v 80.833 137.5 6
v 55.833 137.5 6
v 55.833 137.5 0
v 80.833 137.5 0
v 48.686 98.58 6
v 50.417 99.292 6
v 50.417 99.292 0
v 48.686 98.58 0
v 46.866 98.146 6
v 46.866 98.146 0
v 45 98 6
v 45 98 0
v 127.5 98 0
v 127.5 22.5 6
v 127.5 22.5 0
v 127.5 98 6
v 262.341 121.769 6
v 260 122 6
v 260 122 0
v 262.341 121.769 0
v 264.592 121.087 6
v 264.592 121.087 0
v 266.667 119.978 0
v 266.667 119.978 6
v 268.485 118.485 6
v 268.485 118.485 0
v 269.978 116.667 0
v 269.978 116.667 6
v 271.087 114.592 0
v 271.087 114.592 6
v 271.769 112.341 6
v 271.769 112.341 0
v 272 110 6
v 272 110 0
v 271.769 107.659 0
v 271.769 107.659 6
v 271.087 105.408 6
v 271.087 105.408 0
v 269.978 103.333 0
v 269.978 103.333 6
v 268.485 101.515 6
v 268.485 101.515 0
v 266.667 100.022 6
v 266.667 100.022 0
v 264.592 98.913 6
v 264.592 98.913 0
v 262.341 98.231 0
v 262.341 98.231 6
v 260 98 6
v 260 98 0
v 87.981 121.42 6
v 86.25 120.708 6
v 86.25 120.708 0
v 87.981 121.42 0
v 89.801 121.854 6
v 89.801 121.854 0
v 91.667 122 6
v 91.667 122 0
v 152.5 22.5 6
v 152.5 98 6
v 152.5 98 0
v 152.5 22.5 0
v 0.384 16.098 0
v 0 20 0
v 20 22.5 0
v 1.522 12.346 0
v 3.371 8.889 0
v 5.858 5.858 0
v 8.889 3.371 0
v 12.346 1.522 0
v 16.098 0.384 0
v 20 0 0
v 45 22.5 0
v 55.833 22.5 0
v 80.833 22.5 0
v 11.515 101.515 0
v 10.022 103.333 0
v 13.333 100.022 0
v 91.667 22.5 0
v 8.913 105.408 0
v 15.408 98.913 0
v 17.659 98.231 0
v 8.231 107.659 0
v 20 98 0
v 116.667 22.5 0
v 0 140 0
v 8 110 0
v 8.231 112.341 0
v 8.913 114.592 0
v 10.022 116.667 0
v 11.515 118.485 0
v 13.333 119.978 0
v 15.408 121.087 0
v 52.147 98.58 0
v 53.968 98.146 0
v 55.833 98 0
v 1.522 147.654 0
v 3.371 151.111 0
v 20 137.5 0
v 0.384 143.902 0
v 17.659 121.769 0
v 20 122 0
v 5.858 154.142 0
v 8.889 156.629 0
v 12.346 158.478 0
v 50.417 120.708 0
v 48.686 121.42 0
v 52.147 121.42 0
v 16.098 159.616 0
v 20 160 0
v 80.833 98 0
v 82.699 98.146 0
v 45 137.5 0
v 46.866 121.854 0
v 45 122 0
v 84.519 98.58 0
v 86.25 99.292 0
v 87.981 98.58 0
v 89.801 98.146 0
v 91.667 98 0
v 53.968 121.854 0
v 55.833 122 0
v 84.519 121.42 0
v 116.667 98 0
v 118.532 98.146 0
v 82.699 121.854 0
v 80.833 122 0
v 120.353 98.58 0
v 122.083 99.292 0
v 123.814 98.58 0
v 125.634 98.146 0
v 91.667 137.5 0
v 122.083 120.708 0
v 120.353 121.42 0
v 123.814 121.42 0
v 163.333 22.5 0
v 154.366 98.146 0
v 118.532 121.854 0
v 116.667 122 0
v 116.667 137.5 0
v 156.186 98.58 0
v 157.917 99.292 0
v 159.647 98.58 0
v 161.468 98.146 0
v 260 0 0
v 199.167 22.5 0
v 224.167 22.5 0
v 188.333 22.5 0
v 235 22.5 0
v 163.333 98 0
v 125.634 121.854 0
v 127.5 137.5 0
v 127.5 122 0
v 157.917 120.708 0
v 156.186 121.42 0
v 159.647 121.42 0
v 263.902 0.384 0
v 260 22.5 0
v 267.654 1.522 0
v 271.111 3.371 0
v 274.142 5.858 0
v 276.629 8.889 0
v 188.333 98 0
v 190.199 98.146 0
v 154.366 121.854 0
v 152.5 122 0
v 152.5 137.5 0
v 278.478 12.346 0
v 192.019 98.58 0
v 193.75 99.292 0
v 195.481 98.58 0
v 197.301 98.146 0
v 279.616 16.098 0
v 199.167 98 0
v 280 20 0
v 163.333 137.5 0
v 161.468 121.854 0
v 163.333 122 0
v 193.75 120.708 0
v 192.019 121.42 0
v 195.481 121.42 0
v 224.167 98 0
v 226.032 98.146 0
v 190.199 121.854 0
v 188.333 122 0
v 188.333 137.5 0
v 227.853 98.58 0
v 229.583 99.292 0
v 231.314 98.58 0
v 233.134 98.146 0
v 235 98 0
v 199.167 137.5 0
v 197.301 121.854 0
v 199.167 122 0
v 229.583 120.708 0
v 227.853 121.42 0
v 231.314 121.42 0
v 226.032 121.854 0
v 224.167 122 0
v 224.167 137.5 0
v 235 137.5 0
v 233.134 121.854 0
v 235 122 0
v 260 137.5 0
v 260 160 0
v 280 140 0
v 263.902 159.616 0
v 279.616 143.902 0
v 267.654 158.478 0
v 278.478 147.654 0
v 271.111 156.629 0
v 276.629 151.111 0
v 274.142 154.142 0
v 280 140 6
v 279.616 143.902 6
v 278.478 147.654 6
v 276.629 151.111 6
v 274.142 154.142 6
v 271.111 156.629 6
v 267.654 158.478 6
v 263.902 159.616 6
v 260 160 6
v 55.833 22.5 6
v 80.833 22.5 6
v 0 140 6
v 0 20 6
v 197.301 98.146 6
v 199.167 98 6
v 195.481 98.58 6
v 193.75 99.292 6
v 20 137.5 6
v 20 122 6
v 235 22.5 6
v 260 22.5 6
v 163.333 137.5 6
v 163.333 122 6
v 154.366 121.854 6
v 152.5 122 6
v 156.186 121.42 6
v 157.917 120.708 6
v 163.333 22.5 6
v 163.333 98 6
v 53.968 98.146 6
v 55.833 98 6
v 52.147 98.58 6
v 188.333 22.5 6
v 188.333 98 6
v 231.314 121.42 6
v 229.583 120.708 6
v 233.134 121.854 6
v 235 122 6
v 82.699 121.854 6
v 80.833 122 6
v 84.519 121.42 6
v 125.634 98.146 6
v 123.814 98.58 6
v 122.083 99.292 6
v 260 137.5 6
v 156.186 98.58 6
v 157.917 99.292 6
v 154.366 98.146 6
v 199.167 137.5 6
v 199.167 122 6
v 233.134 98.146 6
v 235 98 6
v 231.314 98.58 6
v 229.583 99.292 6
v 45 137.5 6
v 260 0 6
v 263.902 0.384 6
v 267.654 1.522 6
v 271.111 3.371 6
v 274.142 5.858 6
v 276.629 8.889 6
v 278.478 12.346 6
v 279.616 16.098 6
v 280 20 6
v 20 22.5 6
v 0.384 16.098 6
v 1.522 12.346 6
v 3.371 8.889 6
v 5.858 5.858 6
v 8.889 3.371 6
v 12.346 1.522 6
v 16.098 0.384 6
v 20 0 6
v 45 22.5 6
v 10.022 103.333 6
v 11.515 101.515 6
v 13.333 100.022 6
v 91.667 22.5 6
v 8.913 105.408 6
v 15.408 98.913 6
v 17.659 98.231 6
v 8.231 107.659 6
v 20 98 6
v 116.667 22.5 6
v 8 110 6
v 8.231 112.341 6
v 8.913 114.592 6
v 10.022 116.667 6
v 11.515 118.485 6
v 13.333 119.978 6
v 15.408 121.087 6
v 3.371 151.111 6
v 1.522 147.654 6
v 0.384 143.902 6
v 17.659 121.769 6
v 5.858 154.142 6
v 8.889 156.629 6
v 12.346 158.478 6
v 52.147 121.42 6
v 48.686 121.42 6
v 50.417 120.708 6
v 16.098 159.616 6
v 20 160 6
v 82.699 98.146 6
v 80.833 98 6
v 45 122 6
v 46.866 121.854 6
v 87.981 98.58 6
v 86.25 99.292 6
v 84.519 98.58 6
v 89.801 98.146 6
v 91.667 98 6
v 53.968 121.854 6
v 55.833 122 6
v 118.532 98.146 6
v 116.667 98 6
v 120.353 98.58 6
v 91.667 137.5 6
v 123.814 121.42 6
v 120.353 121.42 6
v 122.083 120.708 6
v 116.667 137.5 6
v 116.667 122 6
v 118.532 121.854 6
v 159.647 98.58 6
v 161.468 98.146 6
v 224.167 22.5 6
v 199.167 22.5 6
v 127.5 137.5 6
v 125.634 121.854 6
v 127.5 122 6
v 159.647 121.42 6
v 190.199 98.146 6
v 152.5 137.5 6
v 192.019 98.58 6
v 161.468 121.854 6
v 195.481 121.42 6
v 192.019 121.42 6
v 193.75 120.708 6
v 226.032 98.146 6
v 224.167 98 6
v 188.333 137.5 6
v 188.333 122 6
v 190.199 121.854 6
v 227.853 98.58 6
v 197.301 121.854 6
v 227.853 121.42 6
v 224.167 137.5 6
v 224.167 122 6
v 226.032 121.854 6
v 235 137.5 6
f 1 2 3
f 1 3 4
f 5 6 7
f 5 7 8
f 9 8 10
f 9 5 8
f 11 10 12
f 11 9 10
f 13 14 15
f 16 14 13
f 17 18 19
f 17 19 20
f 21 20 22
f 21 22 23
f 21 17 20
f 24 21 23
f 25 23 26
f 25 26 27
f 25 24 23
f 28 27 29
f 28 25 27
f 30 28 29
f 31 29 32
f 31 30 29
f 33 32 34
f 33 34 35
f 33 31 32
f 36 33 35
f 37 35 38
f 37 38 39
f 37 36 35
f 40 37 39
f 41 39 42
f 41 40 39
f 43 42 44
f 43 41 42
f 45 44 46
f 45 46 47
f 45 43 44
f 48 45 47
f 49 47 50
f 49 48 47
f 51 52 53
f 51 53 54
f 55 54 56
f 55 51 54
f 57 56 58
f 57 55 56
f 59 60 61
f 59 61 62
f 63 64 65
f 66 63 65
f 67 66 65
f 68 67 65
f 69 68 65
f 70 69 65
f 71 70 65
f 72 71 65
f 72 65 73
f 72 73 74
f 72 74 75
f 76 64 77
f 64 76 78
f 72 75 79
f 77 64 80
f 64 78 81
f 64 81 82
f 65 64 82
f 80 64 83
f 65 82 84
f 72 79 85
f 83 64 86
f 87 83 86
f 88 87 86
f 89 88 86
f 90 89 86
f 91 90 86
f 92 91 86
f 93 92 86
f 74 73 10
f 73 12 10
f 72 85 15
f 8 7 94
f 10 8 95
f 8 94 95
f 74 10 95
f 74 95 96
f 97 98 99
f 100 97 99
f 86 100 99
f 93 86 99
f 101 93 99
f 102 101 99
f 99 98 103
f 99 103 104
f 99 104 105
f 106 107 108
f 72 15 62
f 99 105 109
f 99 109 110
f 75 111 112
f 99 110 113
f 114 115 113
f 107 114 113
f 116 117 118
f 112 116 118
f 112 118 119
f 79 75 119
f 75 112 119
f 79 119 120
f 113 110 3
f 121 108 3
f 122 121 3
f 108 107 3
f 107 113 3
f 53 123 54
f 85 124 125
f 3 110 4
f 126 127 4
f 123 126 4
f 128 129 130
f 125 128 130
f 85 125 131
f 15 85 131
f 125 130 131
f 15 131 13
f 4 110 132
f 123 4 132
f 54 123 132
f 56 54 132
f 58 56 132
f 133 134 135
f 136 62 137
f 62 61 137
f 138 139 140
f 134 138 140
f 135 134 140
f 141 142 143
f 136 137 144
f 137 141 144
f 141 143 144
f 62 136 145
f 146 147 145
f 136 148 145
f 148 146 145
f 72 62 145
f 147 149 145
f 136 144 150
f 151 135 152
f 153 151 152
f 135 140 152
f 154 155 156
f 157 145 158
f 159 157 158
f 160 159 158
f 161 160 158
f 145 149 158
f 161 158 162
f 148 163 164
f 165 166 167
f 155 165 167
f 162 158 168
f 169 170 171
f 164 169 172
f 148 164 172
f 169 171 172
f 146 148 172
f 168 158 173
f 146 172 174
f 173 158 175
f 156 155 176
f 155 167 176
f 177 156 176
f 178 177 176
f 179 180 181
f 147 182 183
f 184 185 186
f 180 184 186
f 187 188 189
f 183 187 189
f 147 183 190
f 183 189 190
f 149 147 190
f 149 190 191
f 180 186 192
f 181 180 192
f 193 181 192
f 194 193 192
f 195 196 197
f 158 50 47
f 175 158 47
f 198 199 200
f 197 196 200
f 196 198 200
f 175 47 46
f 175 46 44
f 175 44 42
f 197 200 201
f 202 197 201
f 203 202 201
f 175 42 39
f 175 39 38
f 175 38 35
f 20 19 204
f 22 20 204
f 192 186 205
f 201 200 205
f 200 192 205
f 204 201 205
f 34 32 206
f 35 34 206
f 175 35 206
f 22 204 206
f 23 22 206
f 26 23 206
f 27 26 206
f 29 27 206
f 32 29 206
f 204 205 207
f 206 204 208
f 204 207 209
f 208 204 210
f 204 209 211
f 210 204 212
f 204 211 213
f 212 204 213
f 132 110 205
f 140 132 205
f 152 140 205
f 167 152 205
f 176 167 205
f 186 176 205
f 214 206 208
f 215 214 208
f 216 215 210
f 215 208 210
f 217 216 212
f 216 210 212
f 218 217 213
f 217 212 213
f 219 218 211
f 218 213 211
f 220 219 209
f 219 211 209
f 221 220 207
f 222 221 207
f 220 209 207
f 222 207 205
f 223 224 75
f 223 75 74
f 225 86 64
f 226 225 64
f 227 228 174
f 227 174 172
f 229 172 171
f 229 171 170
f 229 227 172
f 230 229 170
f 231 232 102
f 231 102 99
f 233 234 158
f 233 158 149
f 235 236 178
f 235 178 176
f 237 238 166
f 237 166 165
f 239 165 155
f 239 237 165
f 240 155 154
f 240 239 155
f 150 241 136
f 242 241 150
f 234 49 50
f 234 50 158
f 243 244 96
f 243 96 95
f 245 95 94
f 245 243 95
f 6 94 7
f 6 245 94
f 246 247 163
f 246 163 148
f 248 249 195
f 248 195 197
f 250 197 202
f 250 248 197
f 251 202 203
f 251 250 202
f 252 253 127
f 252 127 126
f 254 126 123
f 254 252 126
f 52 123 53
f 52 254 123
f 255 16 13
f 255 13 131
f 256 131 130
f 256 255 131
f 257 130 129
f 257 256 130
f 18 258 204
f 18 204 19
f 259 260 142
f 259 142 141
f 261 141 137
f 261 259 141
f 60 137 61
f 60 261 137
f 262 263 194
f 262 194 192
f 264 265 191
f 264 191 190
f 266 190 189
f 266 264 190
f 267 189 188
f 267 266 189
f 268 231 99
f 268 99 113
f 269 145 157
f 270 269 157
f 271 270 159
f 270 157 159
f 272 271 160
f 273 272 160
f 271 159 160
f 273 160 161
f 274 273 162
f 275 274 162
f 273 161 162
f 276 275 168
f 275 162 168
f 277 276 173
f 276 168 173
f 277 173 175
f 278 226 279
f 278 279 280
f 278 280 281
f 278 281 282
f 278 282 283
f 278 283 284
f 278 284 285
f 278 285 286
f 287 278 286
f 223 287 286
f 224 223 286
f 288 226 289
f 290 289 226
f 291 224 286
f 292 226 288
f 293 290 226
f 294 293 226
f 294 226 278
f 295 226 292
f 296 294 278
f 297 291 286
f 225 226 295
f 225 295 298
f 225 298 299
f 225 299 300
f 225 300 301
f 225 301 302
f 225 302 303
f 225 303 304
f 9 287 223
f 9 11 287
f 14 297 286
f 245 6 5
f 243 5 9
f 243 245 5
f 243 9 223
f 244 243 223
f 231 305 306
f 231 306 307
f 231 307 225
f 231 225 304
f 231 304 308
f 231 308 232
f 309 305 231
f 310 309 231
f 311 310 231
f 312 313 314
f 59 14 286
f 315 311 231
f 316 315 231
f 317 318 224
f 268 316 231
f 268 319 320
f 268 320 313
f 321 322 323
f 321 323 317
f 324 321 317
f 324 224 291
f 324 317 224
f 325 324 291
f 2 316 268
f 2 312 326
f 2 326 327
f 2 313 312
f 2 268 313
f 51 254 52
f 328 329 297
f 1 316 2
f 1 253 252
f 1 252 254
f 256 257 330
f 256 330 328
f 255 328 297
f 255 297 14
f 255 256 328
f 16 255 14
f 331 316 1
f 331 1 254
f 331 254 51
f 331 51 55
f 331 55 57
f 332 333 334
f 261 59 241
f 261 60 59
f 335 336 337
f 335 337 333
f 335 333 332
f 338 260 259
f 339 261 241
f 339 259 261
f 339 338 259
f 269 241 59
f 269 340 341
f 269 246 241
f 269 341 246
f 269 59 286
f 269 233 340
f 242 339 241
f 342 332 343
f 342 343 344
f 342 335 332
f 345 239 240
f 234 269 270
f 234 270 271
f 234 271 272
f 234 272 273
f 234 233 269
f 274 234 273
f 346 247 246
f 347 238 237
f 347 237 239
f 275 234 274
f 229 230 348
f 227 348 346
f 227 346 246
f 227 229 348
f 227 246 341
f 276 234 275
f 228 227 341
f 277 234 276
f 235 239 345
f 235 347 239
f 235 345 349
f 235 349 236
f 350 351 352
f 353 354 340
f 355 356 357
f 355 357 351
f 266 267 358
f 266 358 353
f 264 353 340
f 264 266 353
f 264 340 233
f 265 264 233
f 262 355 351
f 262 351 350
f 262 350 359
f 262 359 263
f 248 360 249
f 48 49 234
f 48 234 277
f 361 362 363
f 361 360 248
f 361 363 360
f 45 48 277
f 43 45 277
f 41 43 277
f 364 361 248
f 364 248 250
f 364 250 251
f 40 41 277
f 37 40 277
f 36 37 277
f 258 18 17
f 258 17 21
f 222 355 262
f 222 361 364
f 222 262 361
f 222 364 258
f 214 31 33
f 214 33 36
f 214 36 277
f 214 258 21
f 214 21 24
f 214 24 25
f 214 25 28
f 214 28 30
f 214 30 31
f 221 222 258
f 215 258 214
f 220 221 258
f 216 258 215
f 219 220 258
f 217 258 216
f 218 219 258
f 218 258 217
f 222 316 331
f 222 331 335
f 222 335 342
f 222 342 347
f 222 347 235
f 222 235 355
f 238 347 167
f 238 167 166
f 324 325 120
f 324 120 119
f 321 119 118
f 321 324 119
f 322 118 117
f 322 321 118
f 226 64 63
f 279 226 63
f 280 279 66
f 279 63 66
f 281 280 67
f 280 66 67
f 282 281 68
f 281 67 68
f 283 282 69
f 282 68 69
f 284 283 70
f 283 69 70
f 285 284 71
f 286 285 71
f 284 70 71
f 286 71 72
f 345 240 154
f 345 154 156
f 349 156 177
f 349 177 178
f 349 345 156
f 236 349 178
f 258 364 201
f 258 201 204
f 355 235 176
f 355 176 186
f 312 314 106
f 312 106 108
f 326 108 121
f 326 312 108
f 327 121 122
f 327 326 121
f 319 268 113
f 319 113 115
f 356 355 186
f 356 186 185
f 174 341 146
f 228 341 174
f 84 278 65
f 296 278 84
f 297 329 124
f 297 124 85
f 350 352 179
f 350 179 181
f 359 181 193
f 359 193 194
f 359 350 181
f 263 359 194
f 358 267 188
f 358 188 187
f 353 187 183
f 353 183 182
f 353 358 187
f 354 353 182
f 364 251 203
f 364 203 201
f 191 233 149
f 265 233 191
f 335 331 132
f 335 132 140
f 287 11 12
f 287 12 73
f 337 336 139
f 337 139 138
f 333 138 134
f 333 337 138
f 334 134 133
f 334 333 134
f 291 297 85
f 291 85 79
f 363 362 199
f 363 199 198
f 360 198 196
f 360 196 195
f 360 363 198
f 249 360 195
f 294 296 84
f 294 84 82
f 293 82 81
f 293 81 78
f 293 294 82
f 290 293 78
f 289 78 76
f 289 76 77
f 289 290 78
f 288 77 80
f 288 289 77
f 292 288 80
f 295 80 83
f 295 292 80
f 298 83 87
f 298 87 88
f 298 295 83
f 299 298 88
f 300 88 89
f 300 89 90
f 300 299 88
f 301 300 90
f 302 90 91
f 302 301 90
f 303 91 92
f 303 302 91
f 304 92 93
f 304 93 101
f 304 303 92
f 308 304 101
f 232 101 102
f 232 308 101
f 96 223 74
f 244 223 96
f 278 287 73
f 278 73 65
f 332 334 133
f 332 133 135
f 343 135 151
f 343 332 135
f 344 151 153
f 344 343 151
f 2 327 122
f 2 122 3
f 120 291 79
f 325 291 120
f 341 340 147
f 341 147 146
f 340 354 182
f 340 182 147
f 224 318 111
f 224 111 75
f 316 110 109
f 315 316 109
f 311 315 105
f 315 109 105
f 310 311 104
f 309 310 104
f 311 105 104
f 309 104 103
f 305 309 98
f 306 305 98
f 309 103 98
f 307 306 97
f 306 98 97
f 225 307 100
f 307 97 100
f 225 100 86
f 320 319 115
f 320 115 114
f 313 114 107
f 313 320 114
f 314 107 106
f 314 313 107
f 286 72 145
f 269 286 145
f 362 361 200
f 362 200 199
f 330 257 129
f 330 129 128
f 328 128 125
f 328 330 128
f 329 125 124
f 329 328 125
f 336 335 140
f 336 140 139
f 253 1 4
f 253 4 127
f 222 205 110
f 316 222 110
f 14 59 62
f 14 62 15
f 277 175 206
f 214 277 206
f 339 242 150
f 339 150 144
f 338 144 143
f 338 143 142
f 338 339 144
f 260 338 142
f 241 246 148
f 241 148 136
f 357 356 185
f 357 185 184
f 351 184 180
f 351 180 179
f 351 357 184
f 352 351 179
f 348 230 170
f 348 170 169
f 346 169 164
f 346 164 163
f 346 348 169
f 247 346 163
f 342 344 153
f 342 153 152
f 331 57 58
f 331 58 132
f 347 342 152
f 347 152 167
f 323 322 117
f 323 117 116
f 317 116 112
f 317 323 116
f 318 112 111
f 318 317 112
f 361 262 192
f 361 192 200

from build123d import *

# Parameters (mm, degrees)
BOSS_EXTRUDE1_DEPTH = 6
CUT_EXTRUDE1_DEPTH  = 6


with BuildPart() as part:
    # Sketch1 → Boss-Extrude1 (new body)
    with BuildSketch(Plane.XY):
        with BuildLine():
            Line((20, 0), (260, 0))
            ThreePointArc((260, 0), (274.142135624, 5.857864376), (280, 20))
            Line((280, 20), (280, 140))
            ThreePointArc((280, 140), (274.142135624, 154.142135624), (260, 160))
            Line((260, 160), (20, 160))
            ThreePointArc((20, 160), (5.857864376, 154.142135624), (0, 140))
            Line((0, 140), (0, 20))
            ThreePointArc((0, 20), (5.857864376, 5.857864376), (20, 0))
        make_face()
    extrude(amount=BOSS_EXTRUDE1_DEPTH)

    # Sketch2 → Cut-Extrude1 (cut)
    with BuildSketch(Plane.XY.offset(6)):
        with BuildLine():
            Line((20, 137.5), (45, 137.5))
            Line((45, 137.5), (45, 122))
            ThreePointArc((45, 122), (47.784318939, 121.672513356), (50.416666667, 120.707928008))
            ThreePointArc((50.416666667, 120.707928008), (53.049014395, 121.672513356), (55.833333333, 122))
            Line((55.833333333, 122), (55.833333333, 137.5))
            Line((55.833333333, 137.5), (80.833333333, 137.5))
            Line((80.833333333, 137.5), (80.833333333, 122))
            ThreePointArc((80.833333333, 122), (83.617652272, 121.672513356), (86.25, 120.707928008))
            ThreePointArc((86.25, 120.707928008), (88.882347728, 121.672513356), (91.666666667, 122))
            Line((91.666666667, 122), (91.666666667, 137.5))
            Line((91.666666667, 137.5), (116.666666667, 137.5))
            Line((116.666666667, 137.5), (116.666666667, 122))
            ThreePointArc((116.666666667, 122), (119.450985605, 121.672513356), (122.083333333, 120.707928008))
            ThreePointArc((122.083333333, 120.707928008), (124.715681061, 121.672513356), (127.5, 122))
            Line((127.5, 122), (127.5, 137.5))
            Line((127.5, 137.5), (152.5, 137.5))
            Line((152.5, 137.5), (152.5, 122))
            ThreePointArc((152.5, 122), (155.284318939, 121.672513356), (157.916666667, 120.707928008))
            ThreePointArc((157.916666667, 120.707928008), (160.549014395, 121.672513356), (163.333333333, 122))
            Line((163.333333333, 122), (163.333333333, 137.5))
            Line((163.333333333, 137.5), (188.333333333, 137.5))
            Line((188.333333333, 137.5), (188.333333333, 122))
            ThreePointArc((188.333333333, 122), (191.117652272, 121.672513356), (193.75, 120.707928008))
            ThreePointArc((193.75, 120.707928008), (196.382347728, 121.672513356), (199.166666667, 122))
            Line((199.166666667, 122), (199.166666667, 137.5))
            Line((199.166666667, 137.5), (224.166666667, 137.5))
            Line((224.166666667, 137.5), (224.166666667, 122))
            ThreePointArc((224.166666667, 122), (226.950985605, 121.672513356), (229.583333333, 120.707928008))
            ThreePointArc((229.583333333, 120.707928008), (232.215681061, 121.672513356), (235, 122))
            Line((235, 122), (235, 137.5))
            Line((235, 137.5), (260, 137.5))
            Line((260, 137.5), (260, 122))
            ThreePointArc((260, 122), (272, 110), (260, 98))
            Line((260, 98), (260, 22.5))
            Line((260, 22.5), (235, 22.5))
            Line((235, 22.5), (235, 98))
            ThreePointArc((235, 98), (232.215681061, 98.327486644), (229.583333333, 99.292071992))
            ThreePointArc((229.583333333, 99.292071992), (226.950985605, 98.327486644), (224.166666667, 98))
            Line((224.166666667, 98), (224.166666667, 22.5))
            Line((224.166666667, 22.5), (199.166666667, 22.5))
            Line((199.166666667, 22.5), (199.166666667, 98))
            ThreePointArc((199.166666667, 98), (196.382347728, 98.327486644), (193.75, 99.292071992))
            ThreePointArc((193.75, 99.292071992), (191.117652272, 98.327486644), (188.333333333, 98))
            Line((188.333333333, 98), (188.333333333, 22.5))
            Line((188.333333333, 22.5), (163.333333333, 22.5))
            Line((163.333333333, 22.5), (163.333333333, 98))
            ThreePointArc((163.333333333, 98), (160.549014395, 98.327486644), (157.916666667, 99.292071992))
            ThreePointArc((157.916666667, 99.292071992), (155.284318939, 98.327486644), (152.5, 98))
            Line((152.5, 98), (152.5, 22.5))
            Line((152.5, 22.5), (127.5, 22.5))
            Line((127.5, 22.5), (127.5, 98))
            ThreePointArc((127.5, 98), (124.715681061, 98.327486644), (122.083333333, 99.292071992))
            ThreePointArc((122.083333333, 99.292071992), (119.450985605, 98.327486644), (116.666666667, 98))
            Line((116.666666667, 98), (116.666666667, 22.5))
            Line((116.666666667, 22.5), (91.666666667, 22.5))
            Line((91.666666667, 22.5), (91.666666667, 98))
            ThreePointArc((91.666666667, 98), (88.882347728, 98.327486644), (86.25, 99.292071992))
            ThreePointArc((86.25, 99.292071992), (83.617652272, 98.327486644), (80.833333333, 98))
            Line((80.833333333, 98), (80.833333333, 22.5))
            Line((80.833333333, 22.5), (55.833333333, 22.5))
            Line((55.833333333, 22.5), (55.833333333, 98))
            ThreePointArc((55.833333333, 98), (53.049014395, 98.327486644), (50.416666667, 99.292071992))
            ThreePointArc((50.416666667, 99.292071992), (47.784318939, 98.327486644), (45, 98))
            Line((45, 98), (45, 22.5))
            Line((45, 22.5), (20, 22.5))
            Line((20, 22.5), (20, 98))
            ThreePointArc((20, 98), (8, 110), (20, 122))
            Line((20, 122), (20, 137.5))
        make_face()
    extrude(amount=-CUT_EXTRUDE1_DEPTH, mode=Mode.SUBTRACT)


solid = part.part
